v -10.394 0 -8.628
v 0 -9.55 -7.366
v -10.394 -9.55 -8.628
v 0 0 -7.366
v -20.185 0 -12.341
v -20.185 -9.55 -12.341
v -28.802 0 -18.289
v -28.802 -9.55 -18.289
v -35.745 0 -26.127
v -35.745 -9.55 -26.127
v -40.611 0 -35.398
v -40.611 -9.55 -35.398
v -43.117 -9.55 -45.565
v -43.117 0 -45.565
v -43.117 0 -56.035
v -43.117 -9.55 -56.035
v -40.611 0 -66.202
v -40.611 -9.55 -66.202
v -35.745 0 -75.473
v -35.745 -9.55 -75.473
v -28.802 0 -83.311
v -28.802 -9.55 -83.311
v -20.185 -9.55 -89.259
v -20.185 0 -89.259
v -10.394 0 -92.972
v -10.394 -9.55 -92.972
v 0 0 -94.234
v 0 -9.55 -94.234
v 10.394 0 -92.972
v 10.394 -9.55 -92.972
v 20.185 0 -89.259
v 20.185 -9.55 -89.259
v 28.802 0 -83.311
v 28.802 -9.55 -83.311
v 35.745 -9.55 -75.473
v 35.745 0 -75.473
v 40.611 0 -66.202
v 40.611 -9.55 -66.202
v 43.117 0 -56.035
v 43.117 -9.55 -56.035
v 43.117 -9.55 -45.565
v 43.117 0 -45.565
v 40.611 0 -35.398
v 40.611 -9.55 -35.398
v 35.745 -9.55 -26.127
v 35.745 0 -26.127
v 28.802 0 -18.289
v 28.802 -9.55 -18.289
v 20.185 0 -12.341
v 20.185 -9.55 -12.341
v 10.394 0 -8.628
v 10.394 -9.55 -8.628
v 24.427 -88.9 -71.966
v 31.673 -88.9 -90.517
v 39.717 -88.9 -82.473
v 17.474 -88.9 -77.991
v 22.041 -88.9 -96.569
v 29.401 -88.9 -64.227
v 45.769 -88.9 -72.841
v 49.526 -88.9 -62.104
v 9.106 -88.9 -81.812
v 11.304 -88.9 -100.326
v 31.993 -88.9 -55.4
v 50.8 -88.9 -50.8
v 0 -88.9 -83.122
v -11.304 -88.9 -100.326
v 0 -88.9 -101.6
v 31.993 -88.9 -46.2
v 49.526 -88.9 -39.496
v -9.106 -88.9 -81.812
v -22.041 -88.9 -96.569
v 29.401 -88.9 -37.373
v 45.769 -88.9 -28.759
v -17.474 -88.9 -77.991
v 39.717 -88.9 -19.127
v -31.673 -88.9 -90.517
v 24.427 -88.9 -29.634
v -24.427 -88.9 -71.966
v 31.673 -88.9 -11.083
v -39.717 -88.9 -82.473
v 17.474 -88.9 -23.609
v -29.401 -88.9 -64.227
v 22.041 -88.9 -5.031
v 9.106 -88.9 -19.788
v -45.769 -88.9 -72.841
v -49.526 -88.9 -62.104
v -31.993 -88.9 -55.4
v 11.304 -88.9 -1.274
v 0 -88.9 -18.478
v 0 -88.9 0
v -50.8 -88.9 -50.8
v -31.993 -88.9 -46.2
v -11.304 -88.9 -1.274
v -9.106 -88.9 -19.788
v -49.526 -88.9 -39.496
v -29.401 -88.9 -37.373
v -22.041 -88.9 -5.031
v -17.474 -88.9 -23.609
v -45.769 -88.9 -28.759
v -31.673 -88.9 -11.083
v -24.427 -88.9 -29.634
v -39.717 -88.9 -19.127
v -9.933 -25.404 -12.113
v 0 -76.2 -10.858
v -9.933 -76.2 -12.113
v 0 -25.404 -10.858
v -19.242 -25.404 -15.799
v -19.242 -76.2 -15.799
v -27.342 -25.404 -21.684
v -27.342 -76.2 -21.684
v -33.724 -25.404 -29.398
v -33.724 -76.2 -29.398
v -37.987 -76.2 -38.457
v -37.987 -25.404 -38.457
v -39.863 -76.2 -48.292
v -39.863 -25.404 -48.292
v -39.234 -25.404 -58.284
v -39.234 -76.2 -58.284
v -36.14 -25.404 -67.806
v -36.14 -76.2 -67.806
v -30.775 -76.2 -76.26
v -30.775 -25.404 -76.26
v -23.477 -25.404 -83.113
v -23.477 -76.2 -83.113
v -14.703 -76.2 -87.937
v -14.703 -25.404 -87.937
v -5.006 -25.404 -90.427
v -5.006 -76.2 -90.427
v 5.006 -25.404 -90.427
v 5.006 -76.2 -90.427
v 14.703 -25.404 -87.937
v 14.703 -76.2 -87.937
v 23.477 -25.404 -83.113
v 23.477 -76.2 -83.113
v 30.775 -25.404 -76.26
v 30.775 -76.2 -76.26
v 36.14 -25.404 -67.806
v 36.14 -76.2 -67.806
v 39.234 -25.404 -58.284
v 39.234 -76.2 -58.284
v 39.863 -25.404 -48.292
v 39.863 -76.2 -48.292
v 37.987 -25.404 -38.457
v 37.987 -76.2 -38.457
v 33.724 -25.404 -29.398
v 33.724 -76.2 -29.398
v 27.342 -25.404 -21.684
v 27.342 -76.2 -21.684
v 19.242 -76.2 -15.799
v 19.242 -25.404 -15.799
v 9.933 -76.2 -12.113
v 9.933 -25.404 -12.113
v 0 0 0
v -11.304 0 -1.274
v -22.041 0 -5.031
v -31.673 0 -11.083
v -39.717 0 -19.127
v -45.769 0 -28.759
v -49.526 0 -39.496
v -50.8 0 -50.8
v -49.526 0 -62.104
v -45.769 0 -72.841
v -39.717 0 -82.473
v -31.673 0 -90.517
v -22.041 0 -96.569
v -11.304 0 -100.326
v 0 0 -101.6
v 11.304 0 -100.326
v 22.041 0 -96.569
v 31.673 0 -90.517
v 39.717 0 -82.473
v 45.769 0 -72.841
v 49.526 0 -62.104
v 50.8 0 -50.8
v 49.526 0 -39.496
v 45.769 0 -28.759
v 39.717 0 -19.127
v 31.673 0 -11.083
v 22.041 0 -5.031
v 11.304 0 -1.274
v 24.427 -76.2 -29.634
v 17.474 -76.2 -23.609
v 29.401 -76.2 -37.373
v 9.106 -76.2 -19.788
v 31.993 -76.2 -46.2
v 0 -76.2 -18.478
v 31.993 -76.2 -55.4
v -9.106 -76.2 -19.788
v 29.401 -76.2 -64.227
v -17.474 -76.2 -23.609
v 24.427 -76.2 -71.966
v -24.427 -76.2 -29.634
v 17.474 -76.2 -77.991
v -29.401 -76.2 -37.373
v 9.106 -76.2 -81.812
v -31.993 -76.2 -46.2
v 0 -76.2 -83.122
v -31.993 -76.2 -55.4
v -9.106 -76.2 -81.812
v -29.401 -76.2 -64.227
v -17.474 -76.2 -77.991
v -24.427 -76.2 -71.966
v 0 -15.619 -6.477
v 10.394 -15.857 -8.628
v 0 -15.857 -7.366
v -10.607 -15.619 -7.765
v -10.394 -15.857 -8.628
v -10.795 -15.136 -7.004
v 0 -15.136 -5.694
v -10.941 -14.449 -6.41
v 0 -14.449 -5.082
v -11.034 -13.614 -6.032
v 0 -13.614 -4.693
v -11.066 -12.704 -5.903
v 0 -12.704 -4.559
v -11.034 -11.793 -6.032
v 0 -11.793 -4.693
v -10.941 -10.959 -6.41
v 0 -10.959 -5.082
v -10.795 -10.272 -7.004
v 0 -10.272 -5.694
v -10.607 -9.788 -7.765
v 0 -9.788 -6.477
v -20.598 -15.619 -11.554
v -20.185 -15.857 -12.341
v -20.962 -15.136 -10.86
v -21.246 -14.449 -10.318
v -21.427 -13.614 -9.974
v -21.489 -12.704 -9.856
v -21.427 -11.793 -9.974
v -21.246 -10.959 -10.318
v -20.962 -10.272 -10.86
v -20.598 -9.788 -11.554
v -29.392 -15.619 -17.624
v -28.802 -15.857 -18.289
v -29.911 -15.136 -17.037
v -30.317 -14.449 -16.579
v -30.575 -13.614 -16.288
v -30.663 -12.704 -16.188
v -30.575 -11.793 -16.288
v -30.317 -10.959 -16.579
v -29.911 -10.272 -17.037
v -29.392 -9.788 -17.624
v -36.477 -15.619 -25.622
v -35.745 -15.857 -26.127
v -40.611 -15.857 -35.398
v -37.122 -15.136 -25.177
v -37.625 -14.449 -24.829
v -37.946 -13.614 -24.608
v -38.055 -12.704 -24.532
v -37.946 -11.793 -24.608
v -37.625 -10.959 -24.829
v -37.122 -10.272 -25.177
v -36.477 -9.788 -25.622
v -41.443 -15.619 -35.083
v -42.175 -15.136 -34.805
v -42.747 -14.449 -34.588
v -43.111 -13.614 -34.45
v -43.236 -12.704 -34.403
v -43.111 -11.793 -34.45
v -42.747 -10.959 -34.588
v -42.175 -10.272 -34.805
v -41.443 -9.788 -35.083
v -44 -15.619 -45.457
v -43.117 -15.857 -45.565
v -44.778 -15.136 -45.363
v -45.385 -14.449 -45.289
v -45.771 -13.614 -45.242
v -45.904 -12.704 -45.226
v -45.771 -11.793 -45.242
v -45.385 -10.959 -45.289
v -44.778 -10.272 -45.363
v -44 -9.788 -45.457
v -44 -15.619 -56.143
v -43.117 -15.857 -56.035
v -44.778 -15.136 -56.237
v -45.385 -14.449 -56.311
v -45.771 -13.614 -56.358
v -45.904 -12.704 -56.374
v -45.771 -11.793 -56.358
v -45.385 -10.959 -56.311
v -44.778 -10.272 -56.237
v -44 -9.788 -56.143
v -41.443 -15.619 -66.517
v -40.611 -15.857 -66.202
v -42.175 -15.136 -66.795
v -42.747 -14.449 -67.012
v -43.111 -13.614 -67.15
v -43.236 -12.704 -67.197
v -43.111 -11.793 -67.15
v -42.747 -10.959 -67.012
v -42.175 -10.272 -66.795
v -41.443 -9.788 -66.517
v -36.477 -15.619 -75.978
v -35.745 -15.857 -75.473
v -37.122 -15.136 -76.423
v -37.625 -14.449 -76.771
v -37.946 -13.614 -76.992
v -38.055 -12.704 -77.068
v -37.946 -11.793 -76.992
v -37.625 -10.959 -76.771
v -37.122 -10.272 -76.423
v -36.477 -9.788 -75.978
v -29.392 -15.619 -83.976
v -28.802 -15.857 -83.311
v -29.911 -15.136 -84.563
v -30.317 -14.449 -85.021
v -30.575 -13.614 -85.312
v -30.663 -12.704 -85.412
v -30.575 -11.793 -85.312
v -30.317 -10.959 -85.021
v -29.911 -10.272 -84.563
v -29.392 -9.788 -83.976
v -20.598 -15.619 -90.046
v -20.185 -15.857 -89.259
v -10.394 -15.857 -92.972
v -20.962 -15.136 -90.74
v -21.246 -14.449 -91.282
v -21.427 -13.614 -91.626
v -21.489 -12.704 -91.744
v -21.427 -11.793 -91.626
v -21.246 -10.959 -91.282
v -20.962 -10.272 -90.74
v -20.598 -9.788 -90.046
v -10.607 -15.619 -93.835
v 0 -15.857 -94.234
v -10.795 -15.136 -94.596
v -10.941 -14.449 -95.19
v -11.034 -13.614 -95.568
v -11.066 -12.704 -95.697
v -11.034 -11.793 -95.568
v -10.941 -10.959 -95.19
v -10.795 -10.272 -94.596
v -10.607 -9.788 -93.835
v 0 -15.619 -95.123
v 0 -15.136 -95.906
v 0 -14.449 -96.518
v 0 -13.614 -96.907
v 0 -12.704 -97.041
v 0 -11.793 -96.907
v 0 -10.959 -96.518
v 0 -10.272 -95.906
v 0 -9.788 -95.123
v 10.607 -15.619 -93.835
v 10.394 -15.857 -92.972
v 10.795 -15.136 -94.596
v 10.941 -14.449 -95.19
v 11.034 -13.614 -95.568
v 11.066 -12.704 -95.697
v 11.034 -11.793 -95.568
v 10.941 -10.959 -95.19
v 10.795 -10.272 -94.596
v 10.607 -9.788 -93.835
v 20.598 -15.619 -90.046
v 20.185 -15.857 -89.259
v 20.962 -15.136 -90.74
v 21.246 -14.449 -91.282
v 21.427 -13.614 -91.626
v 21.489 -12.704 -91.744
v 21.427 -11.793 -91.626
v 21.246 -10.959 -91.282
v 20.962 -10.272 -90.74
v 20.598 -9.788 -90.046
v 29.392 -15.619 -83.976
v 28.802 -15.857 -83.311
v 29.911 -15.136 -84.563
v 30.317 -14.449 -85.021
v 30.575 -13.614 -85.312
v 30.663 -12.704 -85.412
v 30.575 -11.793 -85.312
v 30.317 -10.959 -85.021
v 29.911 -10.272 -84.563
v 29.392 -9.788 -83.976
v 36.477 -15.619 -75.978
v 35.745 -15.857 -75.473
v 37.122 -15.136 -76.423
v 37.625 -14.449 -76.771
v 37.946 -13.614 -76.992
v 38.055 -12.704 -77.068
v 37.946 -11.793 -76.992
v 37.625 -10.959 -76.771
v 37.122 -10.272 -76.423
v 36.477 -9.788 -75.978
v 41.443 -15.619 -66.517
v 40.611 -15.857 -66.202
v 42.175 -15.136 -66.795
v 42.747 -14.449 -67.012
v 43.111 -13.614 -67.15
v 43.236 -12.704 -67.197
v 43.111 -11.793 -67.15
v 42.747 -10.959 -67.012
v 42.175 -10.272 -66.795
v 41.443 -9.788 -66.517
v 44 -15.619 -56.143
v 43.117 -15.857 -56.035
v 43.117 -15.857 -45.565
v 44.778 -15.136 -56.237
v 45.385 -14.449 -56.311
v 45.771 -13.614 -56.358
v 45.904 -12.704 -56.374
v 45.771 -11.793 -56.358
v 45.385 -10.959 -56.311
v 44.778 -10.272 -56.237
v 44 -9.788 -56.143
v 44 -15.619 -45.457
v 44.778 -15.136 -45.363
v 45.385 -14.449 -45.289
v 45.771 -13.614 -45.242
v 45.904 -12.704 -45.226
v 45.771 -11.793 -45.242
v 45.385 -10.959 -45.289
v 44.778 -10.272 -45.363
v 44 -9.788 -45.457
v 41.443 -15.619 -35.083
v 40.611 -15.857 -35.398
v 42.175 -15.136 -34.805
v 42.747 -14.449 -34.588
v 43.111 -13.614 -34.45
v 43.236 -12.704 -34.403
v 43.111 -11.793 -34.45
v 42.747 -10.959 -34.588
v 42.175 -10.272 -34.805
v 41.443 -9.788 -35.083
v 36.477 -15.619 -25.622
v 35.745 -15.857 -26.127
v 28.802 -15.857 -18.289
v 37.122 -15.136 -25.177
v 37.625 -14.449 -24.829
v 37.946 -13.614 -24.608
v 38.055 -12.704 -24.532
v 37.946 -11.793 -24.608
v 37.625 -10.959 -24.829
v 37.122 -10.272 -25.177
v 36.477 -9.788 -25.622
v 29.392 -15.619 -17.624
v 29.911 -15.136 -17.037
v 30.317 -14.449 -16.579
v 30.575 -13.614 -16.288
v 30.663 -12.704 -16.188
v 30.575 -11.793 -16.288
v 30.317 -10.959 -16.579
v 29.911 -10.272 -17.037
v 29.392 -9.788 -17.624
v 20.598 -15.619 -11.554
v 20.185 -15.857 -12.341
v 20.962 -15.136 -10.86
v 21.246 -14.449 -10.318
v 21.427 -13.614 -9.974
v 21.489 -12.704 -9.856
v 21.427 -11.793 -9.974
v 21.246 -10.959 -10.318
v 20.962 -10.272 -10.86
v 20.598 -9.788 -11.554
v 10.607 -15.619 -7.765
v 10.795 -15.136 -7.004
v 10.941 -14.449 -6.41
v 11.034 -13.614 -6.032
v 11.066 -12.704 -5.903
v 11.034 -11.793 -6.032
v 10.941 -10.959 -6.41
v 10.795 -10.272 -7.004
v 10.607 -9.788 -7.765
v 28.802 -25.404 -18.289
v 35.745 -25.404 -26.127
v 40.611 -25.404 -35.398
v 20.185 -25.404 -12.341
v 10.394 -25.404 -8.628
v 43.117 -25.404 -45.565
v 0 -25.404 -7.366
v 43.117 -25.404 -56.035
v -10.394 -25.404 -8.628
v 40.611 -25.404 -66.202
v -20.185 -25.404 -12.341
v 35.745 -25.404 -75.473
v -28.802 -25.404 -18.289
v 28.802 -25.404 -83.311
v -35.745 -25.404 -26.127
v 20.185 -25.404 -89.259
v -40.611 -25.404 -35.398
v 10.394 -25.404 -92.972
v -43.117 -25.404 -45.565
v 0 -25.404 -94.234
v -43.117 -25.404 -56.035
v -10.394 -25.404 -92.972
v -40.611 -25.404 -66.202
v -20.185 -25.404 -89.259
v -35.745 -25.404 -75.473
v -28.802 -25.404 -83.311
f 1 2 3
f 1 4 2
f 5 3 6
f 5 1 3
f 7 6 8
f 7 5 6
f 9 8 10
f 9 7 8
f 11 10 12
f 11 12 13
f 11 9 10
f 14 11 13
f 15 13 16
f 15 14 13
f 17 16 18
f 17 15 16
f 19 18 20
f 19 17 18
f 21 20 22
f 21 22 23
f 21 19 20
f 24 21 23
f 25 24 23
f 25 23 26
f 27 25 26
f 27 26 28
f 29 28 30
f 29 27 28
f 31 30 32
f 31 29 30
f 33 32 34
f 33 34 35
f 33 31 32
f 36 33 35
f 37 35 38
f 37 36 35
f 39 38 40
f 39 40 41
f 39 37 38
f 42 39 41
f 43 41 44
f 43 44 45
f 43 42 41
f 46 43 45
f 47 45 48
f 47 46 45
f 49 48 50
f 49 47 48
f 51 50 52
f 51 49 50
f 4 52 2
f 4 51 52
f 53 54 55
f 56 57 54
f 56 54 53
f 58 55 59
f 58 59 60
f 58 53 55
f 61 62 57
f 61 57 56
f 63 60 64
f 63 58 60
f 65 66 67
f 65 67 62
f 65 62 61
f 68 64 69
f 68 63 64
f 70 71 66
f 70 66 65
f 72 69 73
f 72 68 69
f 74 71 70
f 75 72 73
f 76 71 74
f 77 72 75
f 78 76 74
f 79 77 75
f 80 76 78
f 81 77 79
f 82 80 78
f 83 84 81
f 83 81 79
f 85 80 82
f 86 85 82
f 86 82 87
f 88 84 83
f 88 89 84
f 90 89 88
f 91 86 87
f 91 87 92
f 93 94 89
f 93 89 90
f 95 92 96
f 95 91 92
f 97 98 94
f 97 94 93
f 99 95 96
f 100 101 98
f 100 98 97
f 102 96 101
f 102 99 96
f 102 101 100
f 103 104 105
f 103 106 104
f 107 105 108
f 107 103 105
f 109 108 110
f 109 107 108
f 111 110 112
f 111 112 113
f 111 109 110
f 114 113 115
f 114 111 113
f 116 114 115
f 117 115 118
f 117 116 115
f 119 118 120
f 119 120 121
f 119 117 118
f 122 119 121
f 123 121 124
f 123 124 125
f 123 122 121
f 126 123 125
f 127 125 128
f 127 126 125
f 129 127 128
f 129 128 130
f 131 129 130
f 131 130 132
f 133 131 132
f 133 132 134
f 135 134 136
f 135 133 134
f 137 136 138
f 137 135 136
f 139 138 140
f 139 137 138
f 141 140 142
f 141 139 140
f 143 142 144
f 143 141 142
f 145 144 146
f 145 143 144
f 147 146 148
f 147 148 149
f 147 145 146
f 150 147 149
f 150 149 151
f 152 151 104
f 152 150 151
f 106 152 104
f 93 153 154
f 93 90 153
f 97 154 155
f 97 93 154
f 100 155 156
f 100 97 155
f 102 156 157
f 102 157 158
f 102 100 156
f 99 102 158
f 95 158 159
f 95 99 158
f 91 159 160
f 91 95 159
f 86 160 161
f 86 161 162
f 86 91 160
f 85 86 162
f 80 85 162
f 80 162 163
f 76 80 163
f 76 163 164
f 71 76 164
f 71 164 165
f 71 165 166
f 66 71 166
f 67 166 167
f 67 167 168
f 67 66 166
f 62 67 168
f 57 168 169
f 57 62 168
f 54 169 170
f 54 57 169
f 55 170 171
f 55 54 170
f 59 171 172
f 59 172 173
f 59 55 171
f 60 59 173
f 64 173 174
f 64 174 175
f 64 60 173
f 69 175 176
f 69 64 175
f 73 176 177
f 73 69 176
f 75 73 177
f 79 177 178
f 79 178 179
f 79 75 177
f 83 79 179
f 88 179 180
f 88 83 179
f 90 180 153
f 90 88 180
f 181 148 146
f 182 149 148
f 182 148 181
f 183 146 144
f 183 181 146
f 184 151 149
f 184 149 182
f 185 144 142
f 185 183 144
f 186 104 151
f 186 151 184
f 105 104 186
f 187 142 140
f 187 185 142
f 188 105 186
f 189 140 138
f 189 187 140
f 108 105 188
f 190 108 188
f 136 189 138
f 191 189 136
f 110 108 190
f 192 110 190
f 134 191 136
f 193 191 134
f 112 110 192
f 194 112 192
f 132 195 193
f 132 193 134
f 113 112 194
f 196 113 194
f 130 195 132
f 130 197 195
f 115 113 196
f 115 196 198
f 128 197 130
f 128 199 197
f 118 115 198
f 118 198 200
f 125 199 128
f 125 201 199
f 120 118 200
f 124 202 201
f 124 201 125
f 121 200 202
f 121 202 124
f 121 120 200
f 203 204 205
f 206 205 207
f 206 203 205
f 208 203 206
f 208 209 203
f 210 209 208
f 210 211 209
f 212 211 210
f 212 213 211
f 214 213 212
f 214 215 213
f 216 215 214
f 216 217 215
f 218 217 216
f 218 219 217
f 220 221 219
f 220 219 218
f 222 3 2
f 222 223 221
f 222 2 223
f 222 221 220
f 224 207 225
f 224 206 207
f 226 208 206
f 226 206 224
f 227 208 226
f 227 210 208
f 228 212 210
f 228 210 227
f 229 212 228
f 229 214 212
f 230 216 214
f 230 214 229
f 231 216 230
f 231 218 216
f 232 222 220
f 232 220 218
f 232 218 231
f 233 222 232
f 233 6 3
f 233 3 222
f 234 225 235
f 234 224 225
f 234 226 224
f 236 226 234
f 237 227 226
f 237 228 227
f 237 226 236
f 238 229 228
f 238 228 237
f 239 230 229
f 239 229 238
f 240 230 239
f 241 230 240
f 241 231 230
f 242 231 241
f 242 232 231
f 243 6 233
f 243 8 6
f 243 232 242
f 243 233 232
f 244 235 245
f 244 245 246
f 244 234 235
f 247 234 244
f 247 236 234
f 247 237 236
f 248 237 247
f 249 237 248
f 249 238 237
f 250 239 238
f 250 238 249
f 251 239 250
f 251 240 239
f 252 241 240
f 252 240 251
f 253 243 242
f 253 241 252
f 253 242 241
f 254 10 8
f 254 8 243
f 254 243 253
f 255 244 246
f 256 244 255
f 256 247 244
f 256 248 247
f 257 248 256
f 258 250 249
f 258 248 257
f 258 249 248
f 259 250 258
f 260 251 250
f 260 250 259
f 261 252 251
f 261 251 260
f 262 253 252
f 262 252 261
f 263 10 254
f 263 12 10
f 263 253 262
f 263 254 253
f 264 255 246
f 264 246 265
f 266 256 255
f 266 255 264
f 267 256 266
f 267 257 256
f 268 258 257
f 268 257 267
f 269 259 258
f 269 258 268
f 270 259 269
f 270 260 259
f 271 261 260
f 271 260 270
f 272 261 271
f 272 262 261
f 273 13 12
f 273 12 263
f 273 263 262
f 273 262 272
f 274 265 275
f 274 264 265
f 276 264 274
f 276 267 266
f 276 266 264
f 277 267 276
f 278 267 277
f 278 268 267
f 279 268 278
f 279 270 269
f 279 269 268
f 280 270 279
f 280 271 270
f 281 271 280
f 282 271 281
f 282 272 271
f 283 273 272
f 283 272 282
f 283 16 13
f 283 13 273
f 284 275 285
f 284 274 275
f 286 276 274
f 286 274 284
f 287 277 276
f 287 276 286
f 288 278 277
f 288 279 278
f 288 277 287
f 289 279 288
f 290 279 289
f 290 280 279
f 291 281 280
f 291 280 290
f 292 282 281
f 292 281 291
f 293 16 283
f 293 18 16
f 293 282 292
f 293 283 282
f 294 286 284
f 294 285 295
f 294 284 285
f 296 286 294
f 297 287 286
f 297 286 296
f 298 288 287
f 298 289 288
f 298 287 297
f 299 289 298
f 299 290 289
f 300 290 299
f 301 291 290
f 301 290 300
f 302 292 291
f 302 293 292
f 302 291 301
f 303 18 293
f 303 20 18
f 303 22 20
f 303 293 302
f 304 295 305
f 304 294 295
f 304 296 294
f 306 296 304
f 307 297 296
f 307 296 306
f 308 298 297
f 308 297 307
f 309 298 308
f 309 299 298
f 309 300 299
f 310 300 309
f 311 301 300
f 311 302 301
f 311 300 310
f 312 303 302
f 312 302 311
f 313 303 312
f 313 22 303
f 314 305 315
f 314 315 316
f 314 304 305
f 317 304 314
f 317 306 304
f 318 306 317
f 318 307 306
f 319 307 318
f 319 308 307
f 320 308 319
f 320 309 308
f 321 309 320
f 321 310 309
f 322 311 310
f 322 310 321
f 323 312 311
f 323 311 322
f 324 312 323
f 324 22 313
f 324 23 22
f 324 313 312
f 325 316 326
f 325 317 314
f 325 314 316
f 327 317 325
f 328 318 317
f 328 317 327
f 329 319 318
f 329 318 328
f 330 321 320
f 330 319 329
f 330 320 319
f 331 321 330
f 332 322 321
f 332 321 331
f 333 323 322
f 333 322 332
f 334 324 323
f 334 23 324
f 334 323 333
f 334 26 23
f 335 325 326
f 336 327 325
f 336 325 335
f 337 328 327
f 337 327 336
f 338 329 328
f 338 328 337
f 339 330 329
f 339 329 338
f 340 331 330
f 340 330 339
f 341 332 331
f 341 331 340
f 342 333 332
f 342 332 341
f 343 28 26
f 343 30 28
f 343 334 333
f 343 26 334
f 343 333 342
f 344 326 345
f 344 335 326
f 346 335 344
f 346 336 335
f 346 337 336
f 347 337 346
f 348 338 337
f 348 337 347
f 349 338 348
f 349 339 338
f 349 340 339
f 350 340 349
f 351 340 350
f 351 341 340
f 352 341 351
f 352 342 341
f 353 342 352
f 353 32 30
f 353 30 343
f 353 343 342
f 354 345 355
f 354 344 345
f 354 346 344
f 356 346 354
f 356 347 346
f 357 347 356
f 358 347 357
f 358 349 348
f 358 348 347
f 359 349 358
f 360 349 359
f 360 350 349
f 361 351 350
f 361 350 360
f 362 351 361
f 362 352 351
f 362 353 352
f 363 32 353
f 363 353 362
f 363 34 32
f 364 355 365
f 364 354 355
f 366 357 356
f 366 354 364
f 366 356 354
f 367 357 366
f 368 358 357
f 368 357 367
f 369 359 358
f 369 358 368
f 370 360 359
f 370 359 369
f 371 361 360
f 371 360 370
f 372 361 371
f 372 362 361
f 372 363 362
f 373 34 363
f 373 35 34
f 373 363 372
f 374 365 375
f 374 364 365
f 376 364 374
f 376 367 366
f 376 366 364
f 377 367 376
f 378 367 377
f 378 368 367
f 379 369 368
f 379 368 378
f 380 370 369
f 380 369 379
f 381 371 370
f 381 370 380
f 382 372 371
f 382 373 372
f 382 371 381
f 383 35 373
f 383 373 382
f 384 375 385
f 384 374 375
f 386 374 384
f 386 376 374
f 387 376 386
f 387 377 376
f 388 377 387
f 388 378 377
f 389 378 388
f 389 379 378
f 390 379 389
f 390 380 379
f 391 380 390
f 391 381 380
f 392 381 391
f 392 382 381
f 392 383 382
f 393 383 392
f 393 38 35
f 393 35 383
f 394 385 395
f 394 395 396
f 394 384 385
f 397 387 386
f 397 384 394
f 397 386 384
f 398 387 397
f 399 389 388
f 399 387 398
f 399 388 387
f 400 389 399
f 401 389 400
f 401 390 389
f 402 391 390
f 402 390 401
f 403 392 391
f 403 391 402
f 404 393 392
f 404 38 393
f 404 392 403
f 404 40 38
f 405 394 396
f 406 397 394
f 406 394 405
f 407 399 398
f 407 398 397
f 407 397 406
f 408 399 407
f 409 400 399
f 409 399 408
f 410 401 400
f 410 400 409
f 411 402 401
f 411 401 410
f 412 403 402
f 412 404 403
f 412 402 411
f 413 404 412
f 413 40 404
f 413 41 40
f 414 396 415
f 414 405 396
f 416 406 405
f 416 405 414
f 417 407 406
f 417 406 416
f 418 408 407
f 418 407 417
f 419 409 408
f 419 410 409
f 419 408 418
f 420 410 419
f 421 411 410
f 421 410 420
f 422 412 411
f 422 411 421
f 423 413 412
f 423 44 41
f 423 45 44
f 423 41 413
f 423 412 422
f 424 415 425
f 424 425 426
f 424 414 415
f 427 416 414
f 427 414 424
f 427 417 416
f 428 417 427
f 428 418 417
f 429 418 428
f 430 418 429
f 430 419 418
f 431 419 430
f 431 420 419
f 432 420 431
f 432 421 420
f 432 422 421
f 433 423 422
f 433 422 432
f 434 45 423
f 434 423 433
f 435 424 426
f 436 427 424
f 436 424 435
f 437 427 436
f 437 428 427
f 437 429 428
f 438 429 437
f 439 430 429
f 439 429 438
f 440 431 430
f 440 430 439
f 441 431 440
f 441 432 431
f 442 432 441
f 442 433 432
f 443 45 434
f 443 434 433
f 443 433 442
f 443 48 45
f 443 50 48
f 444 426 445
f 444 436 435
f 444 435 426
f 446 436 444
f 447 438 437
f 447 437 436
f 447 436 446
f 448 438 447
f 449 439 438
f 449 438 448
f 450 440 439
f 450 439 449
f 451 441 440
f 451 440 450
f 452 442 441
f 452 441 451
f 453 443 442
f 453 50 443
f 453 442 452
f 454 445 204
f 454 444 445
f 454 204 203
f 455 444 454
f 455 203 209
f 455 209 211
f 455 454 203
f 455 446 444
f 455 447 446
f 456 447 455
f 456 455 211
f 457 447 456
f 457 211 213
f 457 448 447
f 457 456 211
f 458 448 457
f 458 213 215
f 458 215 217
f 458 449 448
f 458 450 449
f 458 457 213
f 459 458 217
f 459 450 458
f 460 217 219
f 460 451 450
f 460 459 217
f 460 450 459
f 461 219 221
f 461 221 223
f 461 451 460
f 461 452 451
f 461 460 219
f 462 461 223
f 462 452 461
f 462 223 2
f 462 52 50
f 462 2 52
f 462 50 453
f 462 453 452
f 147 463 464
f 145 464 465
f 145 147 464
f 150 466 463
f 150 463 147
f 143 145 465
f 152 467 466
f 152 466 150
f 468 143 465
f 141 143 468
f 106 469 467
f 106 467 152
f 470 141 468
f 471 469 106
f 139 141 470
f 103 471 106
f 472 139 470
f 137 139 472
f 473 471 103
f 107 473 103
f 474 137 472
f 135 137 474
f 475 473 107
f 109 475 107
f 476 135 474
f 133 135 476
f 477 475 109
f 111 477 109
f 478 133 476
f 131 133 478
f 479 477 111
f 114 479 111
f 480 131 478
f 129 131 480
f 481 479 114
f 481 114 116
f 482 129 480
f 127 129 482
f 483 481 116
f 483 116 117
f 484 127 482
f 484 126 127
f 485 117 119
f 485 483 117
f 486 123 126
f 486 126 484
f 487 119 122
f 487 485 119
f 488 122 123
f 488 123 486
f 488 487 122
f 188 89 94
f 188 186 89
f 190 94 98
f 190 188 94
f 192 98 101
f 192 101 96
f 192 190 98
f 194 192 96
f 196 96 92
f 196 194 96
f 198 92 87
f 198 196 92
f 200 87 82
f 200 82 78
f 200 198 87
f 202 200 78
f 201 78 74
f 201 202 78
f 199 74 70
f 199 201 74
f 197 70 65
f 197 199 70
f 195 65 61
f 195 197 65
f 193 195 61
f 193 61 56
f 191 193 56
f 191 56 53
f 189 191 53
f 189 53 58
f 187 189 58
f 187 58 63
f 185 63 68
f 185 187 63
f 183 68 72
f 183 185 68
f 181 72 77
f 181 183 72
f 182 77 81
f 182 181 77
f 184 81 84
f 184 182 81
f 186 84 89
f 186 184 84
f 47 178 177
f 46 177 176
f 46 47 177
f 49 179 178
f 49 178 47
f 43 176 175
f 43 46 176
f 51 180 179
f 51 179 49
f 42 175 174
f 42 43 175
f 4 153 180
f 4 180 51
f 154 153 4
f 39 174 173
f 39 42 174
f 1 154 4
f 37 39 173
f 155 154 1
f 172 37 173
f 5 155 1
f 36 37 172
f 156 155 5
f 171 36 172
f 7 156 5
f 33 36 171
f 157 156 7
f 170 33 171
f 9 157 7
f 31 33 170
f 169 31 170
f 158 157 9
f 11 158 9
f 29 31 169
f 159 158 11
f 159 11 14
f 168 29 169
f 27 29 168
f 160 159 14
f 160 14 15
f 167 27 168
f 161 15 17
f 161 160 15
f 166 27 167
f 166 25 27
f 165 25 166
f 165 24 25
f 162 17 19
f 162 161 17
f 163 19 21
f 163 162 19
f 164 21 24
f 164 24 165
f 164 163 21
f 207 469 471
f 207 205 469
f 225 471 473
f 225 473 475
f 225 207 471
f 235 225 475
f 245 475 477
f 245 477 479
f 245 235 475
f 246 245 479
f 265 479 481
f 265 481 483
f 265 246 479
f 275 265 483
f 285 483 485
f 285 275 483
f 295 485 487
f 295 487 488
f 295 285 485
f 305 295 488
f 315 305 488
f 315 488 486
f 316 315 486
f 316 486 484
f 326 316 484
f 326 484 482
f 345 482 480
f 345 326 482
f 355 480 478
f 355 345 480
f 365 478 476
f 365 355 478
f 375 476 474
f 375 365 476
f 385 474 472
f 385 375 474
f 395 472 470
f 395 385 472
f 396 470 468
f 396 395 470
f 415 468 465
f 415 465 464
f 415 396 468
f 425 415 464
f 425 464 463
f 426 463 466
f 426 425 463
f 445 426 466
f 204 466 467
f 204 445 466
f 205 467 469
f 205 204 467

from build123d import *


with BuildPart() as part:
    # Sketch1 → Revolve1 (revolve)
    with BuildSketch(Plane(origin=(0, 0, 0), x_dir=(0, 0, -1), z_dir=(1, 0, 0))):
        with BuildLine():
            Line((0, 0), (0, -88.9))
            Line((0, -88.9), (10.16, -88.9))
            Line((10.16, -88.9), (18.4785, -88.9))
            Line((18.4785, -88.9), (18.4785, -76.2))
            Line((18.4785, -76.2), (10.8585, -76.2))
            Line((10.8585, -76.2), (10.8585, -25.403841866))
            Line((10.8585, -25.403841866), (7.366, -25.403841866))
            Line((7.366, -25.403841866), (7.366, -15.857408119))
            ThreePointArc((7.366, -15.857408119), (4.5593, -12.703841866), (7.366, -9.550275614))
            Line((7.366, -9.550275614), (7.366, 0))
            Line((7.366, 0), (0, 0))
        make_face()
    revolve(axis=Axis((0, -28.313229254, -50.8), (0, -1, 0)))


solid = part.part
